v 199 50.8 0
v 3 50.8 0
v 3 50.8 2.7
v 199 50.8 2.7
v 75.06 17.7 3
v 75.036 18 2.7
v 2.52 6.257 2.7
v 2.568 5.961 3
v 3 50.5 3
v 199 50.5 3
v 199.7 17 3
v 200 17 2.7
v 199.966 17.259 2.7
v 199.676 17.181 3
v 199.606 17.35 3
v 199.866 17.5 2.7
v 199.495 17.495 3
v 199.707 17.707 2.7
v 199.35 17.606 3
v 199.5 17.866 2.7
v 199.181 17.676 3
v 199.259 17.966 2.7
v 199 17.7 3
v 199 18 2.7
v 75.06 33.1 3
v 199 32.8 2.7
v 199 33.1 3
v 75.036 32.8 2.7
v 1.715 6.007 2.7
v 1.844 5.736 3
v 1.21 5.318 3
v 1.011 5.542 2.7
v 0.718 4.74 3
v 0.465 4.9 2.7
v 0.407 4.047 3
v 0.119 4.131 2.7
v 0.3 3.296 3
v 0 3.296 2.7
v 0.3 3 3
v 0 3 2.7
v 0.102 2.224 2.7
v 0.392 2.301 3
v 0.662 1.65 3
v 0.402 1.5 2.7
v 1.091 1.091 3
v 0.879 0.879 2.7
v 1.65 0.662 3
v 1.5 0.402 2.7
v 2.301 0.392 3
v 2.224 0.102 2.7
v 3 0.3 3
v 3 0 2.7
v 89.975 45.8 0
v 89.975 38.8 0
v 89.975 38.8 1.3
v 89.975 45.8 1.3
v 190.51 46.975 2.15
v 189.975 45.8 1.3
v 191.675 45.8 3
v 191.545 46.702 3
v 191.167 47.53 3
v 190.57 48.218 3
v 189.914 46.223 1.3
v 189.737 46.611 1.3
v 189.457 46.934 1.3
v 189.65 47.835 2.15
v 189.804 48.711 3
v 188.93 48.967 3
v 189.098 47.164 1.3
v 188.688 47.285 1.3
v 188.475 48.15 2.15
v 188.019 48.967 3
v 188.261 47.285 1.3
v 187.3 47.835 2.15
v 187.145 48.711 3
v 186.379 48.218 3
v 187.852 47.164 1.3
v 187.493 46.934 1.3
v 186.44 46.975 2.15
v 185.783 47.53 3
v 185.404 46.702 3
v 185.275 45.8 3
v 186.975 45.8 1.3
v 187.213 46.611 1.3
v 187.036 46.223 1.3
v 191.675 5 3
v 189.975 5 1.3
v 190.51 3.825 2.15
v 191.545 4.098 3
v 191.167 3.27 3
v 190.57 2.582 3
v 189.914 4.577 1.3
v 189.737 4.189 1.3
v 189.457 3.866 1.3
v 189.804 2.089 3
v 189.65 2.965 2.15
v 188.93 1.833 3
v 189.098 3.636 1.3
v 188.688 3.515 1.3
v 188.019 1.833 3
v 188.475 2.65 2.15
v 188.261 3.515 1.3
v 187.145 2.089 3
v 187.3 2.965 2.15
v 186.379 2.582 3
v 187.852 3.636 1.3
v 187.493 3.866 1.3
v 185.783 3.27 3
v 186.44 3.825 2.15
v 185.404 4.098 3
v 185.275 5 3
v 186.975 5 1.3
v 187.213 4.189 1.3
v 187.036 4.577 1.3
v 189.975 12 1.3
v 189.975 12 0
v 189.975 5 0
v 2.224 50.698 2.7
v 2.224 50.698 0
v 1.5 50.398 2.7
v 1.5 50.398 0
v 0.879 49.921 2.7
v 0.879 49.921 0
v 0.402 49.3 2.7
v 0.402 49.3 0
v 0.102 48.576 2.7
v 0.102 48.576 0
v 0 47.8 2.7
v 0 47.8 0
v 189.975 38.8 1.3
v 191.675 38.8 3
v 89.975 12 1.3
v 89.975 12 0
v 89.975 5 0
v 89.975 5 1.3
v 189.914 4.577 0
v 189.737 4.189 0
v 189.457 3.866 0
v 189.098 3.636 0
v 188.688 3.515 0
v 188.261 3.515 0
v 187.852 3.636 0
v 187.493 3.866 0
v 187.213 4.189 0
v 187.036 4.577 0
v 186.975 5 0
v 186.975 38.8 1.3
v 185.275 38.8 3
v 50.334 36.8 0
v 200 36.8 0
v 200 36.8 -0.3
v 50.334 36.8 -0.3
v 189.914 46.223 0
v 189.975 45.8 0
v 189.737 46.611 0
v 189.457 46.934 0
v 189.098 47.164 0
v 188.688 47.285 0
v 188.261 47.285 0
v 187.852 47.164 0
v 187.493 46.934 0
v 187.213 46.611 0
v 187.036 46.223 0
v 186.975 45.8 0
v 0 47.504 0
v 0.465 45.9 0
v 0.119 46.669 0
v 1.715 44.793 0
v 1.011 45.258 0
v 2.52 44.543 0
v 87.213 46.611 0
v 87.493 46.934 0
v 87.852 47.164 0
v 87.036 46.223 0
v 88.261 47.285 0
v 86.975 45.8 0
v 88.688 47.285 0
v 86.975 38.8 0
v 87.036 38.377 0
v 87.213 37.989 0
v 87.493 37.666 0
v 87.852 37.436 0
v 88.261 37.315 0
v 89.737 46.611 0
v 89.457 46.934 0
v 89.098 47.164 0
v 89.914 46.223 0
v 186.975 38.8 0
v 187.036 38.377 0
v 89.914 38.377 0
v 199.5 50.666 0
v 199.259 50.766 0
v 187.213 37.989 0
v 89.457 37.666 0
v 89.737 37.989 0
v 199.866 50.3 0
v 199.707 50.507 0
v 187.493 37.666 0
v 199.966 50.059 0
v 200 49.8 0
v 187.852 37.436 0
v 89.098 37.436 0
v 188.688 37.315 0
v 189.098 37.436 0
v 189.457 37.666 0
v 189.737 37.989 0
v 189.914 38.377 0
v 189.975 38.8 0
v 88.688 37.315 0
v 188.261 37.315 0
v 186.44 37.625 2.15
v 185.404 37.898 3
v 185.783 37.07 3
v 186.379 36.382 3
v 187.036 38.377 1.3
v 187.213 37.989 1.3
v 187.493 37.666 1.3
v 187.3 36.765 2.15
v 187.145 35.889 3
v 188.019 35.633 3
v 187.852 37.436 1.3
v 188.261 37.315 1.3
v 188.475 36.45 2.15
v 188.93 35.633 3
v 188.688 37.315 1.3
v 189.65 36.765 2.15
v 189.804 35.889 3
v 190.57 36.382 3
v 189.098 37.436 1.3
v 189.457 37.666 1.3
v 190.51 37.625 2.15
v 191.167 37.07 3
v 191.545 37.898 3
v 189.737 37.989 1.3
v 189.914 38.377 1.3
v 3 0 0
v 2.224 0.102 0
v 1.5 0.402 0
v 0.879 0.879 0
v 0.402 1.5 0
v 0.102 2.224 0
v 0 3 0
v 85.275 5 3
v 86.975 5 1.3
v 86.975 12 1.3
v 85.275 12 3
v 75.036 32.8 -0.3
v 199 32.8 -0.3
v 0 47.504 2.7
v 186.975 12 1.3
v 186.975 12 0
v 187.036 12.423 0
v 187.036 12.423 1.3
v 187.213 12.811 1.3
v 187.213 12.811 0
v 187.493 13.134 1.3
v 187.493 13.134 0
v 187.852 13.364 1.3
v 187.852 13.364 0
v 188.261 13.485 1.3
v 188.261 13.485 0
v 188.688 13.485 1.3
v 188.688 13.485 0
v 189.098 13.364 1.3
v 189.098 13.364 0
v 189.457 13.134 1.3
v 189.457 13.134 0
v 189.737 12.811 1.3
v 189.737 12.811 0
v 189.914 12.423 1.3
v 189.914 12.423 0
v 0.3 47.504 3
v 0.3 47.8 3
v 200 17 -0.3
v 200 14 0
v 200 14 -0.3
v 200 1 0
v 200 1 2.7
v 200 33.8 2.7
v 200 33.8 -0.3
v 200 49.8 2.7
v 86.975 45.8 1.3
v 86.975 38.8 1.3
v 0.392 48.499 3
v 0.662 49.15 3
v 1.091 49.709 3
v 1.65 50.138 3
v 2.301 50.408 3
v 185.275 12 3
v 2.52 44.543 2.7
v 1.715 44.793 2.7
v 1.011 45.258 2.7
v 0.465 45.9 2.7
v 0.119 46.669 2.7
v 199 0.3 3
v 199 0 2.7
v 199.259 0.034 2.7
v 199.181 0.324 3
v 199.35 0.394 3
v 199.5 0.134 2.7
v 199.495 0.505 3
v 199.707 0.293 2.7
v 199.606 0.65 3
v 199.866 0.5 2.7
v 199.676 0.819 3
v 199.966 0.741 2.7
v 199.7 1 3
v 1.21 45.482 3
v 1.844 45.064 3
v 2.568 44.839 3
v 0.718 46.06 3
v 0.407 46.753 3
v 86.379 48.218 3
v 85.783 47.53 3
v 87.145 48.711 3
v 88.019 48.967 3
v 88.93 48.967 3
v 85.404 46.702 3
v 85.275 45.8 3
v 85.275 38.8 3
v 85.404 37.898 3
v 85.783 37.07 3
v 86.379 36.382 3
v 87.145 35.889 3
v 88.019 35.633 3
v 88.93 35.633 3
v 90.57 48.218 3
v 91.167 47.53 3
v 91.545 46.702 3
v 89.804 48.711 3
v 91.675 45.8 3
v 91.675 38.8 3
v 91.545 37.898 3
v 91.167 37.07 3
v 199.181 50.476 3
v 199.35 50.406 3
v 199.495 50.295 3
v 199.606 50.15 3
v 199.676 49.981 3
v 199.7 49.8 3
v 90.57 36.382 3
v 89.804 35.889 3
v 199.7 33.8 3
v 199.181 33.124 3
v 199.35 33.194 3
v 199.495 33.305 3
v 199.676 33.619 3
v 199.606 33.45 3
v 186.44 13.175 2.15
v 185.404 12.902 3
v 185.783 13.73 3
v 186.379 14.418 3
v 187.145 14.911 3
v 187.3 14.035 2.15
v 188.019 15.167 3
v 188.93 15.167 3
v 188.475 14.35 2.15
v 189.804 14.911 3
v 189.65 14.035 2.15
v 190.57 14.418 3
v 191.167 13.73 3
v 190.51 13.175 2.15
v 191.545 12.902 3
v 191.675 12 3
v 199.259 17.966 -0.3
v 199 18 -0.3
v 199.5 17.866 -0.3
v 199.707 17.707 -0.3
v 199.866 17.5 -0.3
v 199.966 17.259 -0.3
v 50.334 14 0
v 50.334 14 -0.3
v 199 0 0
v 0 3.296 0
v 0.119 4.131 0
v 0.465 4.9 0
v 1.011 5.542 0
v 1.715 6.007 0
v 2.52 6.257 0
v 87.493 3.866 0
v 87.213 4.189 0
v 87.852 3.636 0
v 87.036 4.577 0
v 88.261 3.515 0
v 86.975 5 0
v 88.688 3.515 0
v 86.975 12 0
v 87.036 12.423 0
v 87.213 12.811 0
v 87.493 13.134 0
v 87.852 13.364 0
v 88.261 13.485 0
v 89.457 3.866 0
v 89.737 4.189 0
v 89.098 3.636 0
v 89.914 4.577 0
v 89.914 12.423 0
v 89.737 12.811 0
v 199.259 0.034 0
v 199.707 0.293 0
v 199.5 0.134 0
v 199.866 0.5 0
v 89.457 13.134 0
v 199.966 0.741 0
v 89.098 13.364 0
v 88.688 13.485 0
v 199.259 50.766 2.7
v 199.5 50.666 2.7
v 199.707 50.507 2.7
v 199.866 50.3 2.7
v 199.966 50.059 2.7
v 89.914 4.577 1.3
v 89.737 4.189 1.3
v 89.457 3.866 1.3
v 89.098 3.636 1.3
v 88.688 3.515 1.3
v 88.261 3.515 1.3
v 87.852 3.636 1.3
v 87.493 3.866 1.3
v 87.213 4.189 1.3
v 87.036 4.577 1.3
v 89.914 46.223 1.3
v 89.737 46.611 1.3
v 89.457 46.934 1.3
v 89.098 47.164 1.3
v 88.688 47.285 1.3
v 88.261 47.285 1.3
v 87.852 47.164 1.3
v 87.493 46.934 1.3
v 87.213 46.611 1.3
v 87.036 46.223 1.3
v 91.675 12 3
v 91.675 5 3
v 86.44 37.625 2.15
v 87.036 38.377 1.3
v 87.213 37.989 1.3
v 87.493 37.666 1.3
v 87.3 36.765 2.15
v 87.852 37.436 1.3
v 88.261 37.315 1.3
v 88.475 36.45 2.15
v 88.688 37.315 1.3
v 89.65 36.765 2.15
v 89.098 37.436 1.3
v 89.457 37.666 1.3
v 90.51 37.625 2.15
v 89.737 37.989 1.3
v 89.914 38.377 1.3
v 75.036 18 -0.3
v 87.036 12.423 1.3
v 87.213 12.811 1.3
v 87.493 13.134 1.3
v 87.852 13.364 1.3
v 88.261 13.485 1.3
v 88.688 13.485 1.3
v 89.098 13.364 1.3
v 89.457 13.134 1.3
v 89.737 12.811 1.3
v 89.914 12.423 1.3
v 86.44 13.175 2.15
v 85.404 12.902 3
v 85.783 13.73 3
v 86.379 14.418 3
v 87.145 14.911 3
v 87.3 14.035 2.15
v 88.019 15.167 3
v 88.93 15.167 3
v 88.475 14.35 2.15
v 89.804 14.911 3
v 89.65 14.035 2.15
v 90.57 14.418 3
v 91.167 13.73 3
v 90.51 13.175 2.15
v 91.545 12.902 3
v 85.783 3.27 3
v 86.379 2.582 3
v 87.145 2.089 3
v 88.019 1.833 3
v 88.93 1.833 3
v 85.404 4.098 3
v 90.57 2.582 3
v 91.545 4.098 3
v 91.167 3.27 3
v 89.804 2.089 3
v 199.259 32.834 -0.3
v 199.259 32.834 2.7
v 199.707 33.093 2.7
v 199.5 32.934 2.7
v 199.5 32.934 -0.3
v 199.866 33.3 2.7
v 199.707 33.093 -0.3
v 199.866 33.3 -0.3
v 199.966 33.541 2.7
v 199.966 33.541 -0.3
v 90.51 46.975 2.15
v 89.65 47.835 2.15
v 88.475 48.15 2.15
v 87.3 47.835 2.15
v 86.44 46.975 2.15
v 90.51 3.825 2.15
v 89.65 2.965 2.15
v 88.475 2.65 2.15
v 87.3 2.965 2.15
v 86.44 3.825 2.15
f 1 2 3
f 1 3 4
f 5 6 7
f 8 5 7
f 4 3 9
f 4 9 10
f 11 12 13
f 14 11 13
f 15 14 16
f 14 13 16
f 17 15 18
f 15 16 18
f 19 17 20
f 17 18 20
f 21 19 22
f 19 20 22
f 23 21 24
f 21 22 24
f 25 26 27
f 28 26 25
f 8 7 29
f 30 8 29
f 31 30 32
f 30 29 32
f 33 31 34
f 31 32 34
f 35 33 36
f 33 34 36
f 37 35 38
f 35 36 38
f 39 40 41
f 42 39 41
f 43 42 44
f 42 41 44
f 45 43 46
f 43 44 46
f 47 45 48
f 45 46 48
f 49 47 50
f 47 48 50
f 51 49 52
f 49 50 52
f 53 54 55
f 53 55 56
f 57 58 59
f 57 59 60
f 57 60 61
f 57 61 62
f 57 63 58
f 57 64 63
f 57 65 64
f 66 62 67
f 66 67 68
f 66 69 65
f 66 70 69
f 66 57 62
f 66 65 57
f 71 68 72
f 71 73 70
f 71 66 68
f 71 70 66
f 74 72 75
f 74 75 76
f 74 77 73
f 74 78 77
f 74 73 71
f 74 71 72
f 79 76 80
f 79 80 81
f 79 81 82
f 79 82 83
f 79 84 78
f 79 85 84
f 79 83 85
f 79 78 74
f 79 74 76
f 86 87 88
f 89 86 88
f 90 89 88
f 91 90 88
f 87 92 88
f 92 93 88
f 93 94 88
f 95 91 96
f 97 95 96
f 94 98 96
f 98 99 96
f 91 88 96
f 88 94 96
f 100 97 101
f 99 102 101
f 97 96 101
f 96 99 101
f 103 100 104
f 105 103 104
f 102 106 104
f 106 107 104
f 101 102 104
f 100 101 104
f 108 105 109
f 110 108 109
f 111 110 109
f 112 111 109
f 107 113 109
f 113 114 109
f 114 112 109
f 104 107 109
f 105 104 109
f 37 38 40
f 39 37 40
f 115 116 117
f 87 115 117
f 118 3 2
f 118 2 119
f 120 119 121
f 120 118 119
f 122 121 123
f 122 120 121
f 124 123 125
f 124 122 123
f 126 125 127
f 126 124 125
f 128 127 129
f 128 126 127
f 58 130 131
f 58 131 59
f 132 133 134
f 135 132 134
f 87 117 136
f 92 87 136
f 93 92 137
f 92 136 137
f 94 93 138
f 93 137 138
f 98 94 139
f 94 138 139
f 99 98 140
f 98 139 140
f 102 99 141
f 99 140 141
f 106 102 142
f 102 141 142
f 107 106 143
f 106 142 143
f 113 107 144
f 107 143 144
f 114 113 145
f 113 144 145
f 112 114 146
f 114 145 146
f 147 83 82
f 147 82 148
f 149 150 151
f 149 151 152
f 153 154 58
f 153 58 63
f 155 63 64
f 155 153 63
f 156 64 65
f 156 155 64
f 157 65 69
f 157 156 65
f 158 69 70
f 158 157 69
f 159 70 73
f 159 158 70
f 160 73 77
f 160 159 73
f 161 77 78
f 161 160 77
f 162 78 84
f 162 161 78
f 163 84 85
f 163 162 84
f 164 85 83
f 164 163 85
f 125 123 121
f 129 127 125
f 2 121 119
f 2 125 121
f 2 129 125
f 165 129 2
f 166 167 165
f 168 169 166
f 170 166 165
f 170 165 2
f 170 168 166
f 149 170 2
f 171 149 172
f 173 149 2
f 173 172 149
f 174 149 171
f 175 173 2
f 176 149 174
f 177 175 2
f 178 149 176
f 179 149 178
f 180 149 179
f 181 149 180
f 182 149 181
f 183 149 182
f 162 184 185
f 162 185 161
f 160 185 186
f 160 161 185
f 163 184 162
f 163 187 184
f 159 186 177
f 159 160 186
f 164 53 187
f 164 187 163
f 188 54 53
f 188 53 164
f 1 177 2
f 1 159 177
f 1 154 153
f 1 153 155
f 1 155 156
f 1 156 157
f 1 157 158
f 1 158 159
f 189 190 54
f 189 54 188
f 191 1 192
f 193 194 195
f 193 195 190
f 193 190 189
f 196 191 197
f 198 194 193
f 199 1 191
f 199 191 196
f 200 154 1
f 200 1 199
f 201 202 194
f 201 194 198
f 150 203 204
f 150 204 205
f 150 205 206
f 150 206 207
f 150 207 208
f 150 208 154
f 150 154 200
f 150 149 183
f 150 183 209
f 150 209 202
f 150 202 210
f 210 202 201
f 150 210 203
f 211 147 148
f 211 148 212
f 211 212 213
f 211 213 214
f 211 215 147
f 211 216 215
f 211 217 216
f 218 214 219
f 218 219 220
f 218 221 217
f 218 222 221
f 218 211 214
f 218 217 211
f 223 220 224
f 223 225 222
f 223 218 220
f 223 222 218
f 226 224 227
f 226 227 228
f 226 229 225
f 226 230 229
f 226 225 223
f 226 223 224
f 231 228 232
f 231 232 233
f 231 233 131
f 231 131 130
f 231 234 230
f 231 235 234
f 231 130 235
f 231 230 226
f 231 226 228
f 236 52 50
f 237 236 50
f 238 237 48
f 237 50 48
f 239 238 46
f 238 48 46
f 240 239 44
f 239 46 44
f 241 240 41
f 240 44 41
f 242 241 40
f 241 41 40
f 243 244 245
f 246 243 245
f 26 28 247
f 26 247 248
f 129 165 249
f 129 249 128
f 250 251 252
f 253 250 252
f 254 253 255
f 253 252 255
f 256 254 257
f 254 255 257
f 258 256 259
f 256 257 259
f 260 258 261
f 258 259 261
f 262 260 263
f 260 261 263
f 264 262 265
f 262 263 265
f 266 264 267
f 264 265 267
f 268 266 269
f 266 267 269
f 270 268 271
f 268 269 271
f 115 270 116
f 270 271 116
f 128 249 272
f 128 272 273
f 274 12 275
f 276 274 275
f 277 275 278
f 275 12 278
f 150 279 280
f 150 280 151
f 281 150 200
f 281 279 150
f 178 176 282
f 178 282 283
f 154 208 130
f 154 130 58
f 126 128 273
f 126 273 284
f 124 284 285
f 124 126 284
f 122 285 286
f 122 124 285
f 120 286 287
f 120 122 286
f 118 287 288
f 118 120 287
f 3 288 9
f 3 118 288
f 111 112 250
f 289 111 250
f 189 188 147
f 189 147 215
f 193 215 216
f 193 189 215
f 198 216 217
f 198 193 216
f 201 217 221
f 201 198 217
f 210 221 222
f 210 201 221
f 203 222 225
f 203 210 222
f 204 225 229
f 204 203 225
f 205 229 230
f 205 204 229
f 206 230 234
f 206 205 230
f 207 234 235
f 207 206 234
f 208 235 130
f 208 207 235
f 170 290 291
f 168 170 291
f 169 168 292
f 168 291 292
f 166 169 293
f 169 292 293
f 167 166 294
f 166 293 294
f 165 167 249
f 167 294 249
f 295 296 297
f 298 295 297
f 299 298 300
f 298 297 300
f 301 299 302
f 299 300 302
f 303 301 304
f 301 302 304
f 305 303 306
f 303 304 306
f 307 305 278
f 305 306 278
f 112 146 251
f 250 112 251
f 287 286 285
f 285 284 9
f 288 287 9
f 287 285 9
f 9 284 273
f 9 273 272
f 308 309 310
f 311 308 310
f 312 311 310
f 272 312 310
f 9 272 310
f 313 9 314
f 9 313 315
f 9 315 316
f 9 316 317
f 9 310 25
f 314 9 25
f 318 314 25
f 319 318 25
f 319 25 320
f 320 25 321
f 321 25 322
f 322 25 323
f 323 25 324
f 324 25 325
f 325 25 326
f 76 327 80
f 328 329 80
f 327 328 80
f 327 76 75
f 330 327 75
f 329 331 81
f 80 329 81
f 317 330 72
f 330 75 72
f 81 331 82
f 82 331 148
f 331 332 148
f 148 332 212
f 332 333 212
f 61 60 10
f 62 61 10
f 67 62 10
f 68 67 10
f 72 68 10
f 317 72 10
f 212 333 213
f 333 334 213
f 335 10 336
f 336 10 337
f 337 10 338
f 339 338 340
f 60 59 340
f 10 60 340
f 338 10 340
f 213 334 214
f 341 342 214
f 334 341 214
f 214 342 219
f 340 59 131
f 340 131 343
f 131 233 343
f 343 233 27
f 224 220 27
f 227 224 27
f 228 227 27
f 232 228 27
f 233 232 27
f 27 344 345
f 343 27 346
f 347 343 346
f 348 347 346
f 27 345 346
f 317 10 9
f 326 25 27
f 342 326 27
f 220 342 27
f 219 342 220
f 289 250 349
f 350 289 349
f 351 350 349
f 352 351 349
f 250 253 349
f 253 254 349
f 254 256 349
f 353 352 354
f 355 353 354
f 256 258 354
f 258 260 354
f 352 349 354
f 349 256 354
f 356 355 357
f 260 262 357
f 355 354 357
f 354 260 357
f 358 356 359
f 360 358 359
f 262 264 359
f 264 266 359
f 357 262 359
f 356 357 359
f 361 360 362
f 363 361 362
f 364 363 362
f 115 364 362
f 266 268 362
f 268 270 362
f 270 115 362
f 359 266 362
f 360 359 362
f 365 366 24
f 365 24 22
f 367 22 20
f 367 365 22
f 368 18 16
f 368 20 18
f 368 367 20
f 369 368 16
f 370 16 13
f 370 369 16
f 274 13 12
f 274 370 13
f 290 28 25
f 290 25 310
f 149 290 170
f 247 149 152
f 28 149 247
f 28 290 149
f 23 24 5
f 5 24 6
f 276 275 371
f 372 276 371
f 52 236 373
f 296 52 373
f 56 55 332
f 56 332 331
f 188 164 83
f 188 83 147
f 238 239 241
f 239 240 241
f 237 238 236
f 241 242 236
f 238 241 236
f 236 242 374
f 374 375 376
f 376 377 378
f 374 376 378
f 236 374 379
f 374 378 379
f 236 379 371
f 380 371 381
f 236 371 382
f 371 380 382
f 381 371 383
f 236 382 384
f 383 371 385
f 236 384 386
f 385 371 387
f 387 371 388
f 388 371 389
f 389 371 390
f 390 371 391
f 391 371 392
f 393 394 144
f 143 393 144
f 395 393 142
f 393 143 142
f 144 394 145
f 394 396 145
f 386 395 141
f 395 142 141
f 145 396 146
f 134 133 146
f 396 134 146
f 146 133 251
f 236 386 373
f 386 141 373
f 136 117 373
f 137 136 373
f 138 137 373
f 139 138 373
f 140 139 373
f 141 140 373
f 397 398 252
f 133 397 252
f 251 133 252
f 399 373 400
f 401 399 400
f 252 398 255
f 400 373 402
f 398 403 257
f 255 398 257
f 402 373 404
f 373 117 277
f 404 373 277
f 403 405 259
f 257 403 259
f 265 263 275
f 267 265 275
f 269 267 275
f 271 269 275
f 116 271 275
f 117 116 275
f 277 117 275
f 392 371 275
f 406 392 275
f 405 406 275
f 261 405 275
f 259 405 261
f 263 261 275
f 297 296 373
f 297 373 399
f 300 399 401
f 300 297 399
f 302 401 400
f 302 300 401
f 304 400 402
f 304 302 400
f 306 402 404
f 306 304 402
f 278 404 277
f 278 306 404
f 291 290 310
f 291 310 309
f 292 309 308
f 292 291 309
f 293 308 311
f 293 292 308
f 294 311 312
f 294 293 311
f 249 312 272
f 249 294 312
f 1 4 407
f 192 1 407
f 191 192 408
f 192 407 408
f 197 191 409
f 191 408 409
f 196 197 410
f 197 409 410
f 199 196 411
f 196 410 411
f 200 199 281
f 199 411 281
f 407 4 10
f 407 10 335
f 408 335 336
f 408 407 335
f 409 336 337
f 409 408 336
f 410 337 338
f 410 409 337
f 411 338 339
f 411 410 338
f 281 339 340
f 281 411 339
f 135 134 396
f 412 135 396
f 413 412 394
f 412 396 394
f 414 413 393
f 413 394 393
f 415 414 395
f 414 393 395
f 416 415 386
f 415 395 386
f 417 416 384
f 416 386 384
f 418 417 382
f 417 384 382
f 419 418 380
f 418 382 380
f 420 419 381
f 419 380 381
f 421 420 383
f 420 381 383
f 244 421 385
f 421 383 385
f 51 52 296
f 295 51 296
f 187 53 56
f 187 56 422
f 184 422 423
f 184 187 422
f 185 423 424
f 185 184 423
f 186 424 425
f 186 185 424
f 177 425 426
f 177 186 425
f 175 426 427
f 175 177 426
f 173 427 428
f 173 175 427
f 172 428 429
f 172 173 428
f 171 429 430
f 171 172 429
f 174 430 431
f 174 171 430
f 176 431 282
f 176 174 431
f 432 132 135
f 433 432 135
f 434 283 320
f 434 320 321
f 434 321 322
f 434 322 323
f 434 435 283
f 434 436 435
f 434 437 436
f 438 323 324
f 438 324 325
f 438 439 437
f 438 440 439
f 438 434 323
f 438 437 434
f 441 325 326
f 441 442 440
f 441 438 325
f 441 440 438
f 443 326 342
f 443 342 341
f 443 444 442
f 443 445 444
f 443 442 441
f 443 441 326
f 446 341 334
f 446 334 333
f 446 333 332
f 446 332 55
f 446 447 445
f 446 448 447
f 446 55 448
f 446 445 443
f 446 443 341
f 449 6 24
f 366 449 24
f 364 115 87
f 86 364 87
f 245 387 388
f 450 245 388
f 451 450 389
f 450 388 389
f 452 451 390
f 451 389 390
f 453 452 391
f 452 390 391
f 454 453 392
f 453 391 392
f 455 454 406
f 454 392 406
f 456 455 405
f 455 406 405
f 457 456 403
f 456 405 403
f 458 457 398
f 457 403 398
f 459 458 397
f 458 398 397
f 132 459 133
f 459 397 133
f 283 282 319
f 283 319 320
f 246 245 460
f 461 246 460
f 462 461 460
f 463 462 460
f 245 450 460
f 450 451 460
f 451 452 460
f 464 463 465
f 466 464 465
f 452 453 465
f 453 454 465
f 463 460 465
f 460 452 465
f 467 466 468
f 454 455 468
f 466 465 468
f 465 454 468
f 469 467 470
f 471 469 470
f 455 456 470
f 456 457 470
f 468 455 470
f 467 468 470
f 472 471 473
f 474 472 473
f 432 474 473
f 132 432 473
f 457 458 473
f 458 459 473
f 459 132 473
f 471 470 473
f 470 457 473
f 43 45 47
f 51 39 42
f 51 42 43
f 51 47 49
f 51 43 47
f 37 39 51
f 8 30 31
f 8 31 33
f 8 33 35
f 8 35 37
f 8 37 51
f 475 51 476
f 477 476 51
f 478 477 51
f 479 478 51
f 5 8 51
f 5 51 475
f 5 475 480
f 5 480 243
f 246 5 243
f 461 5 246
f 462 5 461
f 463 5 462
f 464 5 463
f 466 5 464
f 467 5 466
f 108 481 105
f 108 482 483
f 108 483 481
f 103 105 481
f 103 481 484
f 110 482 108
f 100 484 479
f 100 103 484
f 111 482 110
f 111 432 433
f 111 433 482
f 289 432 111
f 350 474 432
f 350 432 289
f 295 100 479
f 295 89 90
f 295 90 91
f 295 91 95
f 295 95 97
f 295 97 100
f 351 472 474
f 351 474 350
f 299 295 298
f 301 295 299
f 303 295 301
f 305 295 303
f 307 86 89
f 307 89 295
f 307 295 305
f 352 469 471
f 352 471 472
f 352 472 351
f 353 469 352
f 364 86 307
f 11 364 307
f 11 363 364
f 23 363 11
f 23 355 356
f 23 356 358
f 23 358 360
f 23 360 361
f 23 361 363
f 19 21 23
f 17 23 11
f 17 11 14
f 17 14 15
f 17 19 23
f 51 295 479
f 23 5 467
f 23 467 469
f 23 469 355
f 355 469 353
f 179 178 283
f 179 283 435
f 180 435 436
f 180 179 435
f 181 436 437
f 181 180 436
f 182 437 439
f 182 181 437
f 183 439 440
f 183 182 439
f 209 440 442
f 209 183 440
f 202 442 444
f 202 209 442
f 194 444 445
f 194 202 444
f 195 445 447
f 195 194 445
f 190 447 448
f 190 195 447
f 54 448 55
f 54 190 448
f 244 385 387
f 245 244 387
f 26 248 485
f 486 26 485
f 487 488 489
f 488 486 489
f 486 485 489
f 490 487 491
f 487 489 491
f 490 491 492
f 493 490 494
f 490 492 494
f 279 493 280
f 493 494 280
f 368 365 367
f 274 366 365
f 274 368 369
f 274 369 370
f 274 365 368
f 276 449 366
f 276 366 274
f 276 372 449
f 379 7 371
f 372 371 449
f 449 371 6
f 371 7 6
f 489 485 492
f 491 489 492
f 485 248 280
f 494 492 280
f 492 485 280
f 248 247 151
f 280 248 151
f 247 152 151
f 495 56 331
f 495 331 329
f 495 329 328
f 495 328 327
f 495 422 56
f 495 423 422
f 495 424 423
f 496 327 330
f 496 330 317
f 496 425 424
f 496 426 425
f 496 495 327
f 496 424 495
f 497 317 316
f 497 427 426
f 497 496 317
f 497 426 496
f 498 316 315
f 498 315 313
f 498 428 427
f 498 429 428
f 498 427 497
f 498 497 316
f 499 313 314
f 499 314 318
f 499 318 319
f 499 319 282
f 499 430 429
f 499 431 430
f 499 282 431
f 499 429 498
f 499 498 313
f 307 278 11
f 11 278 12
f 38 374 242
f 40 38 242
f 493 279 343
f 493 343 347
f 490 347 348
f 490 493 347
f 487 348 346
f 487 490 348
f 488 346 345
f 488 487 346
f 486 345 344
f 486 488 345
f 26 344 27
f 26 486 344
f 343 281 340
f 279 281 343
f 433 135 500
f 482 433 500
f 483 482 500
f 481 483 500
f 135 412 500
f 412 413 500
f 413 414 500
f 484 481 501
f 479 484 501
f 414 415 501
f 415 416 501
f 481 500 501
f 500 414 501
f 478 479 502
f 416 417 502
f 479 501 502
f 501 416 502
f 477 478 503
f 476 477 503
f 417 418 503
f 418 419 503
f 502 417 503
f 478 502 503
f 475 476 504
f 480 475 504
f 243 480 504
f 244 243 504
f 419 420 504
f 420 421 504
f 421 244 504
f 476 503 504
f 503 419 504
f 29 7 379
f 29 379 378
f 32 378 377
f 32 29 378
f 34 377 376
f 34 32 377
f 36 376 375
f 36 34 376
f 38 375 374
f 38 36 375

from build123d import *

# Parameters (mm, degrees)
F1_DEPTH    = 3
F3_DEPTH    = 0.3
F6_R        = 3
F6_2_R      = 3
F8_R        = 1
F8_2_R      = 1
F9_SIZE     = 0.3
F9_2_SIZE   = 0.3
F10_SIZE2   = 1.7
F10_SIZE    = 1.7
F10_2_SIZE2 = 1.7
F10_2_SIZE  = 1.7


# Not quite as in the source:
# - two fillets or chamfers of one size are made in one step
# - a feature names something its author has since deleted; it is built from what else it names


with BuildPart() as f1:
    # F0 (on Top) → F1 (new body)
    with BuildSketch(Plane.XY):
        Polygon((0, 5.8492044918), (0, 0), (200, 0), (200, 18), (75.0357434154, 18), align=None)
        with BuildLine():
            Line((89.974817574, 12), (89.974817574, 5))
            ThreePointArc((89.974817574, 5), (88.474817574, 3.5), (86.974817574, 5))
            Line((86.974817574, 5), (86.974817574, 12))
            ThreePointArc((86.974817574, 12), (88.474817574, 13.5), (89.974817574, 12))
        make_face(mode=Mode.SUBTRACT)
        with BuildLine():
            Line((189.974817574, 12), (189.974817574, 5))
            ThreePointArc((189.974817574, 5), (188.474817574, 3.5), (186.974817574, 5))
            Line((186.974817574, 5), (186.974817574, 12))
            ThreePointArc((186.974817574, 12), (188.474817574, 13.5), (189.974817574, 12))
        make_face(mode=Mode.SUBTRACT)
    extrude(amount=F1_DEPTH)

    # F2 (on face) → F3 (join)
    with BuildSketch(Plane(origin=(0, 0, 0), x_dir=(1, 0, 0), z_dir=(0, 0, -1))):
        Polygon((50.3342353158, -14), (75.0357434154, -18), (200, -18), (200, -14), align=None)
    extrude(amount=F3_DEPTH)


with BuildPart() as f5_1:
    # F5: instance of F1
    add(f1.part.mirror(Plane(origin=(100, 25.4, 1.5), x_dir=(1, 0, 0), z_dir=(0, -1, 0))))

    # F6#2
    f6_2_edges = [f5_1.edges().sort_by_distance(p)[0] for p in [
        (0, 44.950796, 1.5),
        (0, 50.8, 1.5),
    ]]
    fillet(f6_2_edges, radius=F6_2_R)

    # F8#2
    f8_2_edges = [f5_1.edges().sort_by_distance(p)[0] for p in [
        (200, 50.8, 1.5),
        (200, 32.8, 1.35),
    ]]
    fillet(f8_2_edges, radius=F8_2_R)

    # F9#2
    f9_2_edges = [f5_1.edges().sort_by_distance(p)[0] for p in [
        (137.017872, 32.8, 3),
        (200, 41.8, 3),
        (199.707107, 50.507107, 3),
        (101, 50.8, 3),
        (38.778095, 38.671325, 3),
        (0.87868, 49.92132, 3),
        (0.715415, 45.55968, 3),
        (0, 47.652037, 3),
        (199.707107, 33.092893, 3),
    ]]
    chamfer(f9_2_edges, length=F9_2_SIZE)

    # F10#2
    f10_2_edges = [f5_1.edges().sort_by_distance(p)[0] for p in [
        (189.974818, 42.3, 3),
        (188.474818, 37.3, 3),
        (186.974818, 42.3, 3),
        (188.474818, 47.3, 3),
        (88.474818, 47.3, 3),
        (89.974818, 42.3, 3),
        (88.474818, 37.3, 3),
        (86.974818, 42.3, 3),
    ]]
    chamfer(f10_2_edges, length=F10_2_SIZE, length2=F10_2_SIZE2)


with BuildPart() as f1_1:
    add(f1.part)

    # F6
    f6_edges = [f1_1.edges().sort_by_distance(p)[0] for p in [
        (0, 5.849204, 1.5),
        (0, 0, 1.5),
    ]]
    fillet(f6_edges, radius=F6_R)

    # F8
    f8_edges = [f1_1.edges().sort_by_distance(p)[0] for p in [
        (200, 0, 1.5),
        (200, 18, 1.35),
    ]]
    fillet(f8_edges, radius=F8_R)

    # F9
    f9_edges = [f1_1.edges().sort_by_distance(p)[0] for p in [
        (137.017872, 18, 3),
        (200, 9, 3),
        (199.707107, 0.292893, 3),
        (101, 0, 3),
        (38.778095, 12.128675, 3),
        (0.87868, 0.87868, 3),
        (0.715415, 5.24032, 3),
        (0, 3.147963, 3),
        (199.707107, 17.707107, 3),
    ]]
    chamfer(f9_edges, length=F9_SIZE)

    # F10
    f10_edges = [f1_1.edges().sort_by_distance(p)[0] for p in [
        (89.974818, 8.5, 3),
        (88.474818, 13.5, 3),
        (86.974818, 8.5, 3),
        (88.474818, 3.5, 3),
        (188.474818, 13.5, 3),
        (189.974818, 8.5, 3),
        (188.474818, 3.5, 3),
        (186.974818, 8.5, 3),
    ]]
    chamfer(f10_edges, length=F10_SIZE, length2=F10_SIZE2)


solid = Compound([f5_1.part, f1_1.part])
